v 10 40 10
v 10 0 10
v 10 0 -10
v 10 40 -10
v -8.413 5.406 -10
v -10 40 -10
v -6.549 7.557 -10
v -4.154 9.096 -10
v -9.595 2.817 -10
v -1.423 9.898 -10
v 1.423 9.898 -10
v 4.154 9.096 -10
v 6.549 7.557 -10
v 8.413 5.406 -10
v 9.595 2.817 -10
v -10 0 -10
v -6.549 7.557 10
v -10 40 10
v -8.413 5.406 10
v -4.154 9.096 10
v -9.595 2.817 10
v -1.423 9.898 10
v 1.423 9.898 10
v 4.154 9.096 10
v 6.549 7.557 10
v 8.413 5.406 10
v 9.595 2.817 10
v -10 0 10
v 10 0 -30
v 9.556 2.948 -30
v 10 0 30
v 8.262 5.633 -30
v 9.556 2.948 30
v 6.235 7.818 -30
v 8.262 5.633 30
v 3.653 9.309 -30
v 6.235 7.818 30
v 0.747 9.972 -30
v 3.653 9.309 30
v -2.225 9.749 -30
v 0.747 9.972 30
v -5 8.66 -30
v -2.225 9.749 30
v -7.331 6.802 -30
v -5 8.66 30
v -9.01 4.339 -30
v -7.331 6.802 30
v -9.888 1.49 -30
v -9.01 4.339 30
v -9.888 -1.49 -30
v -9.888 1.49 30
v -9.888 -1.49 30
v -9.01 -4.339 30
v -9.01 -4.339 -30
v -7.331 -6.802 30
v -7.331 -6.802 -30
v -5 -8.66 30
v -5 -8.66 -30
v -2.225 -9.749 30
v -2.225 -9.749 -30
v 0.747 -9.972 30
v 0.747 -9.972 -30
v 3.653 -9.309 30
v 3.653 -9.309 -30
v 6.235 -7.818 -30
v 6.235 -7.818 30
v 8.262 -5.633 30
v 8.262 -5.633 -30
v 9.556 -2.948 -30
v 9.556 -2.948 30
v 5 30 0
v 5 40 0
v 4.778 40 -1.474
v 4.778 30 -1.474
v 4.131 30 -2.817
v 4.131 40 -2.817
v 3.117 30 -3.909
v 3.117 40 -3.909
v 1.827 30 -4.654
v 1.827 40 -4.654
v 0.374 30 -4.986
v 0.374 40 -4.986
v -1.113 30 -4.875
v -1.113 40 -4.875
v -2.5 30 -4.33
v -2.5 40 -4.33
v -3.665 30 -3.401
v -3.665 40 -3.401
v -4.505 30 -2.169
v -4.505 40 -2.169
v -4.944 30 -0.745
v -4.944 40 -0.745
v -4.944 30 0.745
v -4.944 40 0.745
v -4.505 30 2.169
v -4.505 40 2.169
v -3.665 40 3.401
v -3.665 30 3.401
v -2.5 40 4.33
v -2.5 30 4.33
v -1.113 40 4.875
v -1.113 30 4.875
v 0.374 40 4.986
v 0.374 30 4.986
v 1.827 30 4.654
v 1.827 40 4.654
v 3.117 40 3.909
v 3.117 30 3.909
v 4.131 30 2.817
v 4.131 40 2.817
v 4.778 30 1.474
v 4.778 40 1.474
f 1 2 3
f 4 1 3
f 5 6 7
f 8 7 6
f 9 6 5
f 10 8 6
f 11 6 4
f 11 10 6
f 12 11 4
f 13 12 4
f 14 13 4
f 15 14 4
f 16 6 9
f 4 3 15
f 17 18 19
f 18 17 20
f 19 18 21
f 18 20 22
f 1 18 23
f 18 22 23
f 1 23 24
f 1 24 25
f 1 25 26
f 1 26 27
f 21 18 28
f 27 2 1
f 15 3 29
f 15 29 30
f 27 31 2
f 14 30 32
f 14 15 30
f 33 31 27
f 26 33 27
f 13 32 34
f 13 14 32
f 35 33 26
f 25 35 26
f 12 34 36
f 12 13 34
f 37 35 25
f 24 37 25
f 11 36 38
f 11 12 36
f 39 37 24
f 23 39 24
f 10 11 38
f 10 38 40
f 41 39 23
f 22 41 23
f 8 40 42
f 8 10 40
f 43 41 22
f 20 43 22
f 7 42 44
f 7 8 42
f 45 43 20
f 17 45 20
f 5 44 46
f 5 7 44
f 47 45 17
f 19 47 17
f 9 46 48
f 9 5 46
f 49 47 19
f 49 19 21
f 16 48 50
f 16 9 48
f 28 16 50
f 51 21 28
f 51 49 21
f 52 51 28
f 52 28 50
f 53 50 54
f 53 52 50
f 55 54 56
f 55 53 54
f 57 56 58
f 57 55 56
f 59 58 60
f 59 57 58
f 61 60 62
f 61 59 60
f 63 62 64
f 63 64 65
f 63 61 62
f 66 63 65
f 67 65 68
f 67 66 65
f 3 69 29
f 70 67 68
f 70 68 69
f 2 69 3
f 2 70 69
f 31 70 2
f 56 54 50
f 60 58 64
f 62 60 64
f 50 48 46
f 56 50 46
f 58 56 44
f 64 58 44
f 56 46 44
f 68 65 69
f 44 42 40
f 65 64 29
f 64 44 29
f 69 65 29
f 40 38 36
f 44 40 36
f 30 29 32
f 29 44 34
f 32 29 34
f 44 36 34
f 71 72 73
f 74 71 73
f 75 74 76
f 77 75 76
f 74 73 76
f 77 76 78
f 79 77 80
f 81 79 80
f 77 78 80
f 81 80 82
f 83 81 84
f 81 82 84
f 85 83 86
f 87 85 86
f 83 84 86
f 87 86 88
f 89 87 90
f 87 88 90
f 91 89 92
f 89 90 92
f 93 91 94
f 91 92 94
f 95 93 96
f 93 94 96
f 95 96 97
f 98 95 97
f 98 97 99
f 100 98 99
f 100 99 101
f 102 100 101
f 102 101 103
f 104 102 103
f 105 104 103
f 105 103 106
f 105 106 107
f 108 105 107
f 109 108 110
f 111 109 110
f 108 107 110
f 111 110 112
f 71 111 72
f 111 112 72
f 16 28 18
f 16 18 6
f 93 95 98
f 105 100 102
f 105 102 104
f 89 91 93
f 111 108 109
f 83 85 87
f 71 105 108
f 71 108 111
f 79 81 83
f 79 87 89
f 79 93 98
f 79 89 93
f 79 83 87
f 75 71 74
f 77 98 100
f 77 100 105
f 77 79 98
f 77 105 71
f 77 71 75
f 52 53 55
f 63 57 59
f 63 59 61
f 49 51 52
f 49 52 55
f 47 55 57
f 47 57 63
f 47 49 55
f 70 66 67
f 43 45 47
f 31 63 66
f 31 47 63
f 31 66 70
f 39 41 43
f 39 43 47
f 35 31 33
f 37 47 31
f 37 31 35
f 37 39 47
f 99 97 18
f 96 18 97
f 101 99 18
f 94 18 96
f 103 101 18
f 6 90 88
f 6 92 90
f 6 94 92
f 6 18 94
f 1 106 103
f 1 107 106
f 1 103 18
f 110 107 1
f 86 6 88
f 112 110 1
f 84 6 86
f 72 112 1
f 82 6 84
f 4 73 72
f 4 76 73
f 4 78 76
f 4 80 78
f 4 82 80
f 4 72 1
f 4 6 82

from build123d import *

# Parameters (mm, degrees)
SKETCH2_R           = 10
BOSS_EXTRUDE1_DEPTH = 30
SKETCH3_W           = 20
SKETCH3_H           = 20
BOSS_EXTRUDE2_DEPTH = 40
SKETCH4_R           = 5
CUT_EXTRUDE1_DEPTH  = 10


with BuildPart() as part:
    # Sketch2 → Boss-Extrude1 (new body, symmetric)
    with BuildSketch(Plane.XY):
        Circle(SKETCH2_R)
    extrude(amount=BOSS_EXTRUDE1_DEPTH, both=True)

    # Sketch3 → Boss-Extrude2 (add)
    with BuildSketch(Plane(origin=(0, 0, 0), x_dir=(1, 0, 0), z_dir=(0, 1, 0))):
        Rectangle(SKETCH3_W, SKETCH3_H)
    extrude(amount=BOSS_EXTRUDE2_DEPTH)

    # Sketch4 → Cut-Extrude1 (cut)
    with BuildSketch(Plane(origin=(0, 40, 0), x_dir=(1, 0, 0), z_dir=(0, 1, 0))):
        Circle(SKETCH4_R)
    extrude(amount=-CUT_EXTRUDE1_DEPTH, mode=Mode.SUBTRACT)


solid = part.part
